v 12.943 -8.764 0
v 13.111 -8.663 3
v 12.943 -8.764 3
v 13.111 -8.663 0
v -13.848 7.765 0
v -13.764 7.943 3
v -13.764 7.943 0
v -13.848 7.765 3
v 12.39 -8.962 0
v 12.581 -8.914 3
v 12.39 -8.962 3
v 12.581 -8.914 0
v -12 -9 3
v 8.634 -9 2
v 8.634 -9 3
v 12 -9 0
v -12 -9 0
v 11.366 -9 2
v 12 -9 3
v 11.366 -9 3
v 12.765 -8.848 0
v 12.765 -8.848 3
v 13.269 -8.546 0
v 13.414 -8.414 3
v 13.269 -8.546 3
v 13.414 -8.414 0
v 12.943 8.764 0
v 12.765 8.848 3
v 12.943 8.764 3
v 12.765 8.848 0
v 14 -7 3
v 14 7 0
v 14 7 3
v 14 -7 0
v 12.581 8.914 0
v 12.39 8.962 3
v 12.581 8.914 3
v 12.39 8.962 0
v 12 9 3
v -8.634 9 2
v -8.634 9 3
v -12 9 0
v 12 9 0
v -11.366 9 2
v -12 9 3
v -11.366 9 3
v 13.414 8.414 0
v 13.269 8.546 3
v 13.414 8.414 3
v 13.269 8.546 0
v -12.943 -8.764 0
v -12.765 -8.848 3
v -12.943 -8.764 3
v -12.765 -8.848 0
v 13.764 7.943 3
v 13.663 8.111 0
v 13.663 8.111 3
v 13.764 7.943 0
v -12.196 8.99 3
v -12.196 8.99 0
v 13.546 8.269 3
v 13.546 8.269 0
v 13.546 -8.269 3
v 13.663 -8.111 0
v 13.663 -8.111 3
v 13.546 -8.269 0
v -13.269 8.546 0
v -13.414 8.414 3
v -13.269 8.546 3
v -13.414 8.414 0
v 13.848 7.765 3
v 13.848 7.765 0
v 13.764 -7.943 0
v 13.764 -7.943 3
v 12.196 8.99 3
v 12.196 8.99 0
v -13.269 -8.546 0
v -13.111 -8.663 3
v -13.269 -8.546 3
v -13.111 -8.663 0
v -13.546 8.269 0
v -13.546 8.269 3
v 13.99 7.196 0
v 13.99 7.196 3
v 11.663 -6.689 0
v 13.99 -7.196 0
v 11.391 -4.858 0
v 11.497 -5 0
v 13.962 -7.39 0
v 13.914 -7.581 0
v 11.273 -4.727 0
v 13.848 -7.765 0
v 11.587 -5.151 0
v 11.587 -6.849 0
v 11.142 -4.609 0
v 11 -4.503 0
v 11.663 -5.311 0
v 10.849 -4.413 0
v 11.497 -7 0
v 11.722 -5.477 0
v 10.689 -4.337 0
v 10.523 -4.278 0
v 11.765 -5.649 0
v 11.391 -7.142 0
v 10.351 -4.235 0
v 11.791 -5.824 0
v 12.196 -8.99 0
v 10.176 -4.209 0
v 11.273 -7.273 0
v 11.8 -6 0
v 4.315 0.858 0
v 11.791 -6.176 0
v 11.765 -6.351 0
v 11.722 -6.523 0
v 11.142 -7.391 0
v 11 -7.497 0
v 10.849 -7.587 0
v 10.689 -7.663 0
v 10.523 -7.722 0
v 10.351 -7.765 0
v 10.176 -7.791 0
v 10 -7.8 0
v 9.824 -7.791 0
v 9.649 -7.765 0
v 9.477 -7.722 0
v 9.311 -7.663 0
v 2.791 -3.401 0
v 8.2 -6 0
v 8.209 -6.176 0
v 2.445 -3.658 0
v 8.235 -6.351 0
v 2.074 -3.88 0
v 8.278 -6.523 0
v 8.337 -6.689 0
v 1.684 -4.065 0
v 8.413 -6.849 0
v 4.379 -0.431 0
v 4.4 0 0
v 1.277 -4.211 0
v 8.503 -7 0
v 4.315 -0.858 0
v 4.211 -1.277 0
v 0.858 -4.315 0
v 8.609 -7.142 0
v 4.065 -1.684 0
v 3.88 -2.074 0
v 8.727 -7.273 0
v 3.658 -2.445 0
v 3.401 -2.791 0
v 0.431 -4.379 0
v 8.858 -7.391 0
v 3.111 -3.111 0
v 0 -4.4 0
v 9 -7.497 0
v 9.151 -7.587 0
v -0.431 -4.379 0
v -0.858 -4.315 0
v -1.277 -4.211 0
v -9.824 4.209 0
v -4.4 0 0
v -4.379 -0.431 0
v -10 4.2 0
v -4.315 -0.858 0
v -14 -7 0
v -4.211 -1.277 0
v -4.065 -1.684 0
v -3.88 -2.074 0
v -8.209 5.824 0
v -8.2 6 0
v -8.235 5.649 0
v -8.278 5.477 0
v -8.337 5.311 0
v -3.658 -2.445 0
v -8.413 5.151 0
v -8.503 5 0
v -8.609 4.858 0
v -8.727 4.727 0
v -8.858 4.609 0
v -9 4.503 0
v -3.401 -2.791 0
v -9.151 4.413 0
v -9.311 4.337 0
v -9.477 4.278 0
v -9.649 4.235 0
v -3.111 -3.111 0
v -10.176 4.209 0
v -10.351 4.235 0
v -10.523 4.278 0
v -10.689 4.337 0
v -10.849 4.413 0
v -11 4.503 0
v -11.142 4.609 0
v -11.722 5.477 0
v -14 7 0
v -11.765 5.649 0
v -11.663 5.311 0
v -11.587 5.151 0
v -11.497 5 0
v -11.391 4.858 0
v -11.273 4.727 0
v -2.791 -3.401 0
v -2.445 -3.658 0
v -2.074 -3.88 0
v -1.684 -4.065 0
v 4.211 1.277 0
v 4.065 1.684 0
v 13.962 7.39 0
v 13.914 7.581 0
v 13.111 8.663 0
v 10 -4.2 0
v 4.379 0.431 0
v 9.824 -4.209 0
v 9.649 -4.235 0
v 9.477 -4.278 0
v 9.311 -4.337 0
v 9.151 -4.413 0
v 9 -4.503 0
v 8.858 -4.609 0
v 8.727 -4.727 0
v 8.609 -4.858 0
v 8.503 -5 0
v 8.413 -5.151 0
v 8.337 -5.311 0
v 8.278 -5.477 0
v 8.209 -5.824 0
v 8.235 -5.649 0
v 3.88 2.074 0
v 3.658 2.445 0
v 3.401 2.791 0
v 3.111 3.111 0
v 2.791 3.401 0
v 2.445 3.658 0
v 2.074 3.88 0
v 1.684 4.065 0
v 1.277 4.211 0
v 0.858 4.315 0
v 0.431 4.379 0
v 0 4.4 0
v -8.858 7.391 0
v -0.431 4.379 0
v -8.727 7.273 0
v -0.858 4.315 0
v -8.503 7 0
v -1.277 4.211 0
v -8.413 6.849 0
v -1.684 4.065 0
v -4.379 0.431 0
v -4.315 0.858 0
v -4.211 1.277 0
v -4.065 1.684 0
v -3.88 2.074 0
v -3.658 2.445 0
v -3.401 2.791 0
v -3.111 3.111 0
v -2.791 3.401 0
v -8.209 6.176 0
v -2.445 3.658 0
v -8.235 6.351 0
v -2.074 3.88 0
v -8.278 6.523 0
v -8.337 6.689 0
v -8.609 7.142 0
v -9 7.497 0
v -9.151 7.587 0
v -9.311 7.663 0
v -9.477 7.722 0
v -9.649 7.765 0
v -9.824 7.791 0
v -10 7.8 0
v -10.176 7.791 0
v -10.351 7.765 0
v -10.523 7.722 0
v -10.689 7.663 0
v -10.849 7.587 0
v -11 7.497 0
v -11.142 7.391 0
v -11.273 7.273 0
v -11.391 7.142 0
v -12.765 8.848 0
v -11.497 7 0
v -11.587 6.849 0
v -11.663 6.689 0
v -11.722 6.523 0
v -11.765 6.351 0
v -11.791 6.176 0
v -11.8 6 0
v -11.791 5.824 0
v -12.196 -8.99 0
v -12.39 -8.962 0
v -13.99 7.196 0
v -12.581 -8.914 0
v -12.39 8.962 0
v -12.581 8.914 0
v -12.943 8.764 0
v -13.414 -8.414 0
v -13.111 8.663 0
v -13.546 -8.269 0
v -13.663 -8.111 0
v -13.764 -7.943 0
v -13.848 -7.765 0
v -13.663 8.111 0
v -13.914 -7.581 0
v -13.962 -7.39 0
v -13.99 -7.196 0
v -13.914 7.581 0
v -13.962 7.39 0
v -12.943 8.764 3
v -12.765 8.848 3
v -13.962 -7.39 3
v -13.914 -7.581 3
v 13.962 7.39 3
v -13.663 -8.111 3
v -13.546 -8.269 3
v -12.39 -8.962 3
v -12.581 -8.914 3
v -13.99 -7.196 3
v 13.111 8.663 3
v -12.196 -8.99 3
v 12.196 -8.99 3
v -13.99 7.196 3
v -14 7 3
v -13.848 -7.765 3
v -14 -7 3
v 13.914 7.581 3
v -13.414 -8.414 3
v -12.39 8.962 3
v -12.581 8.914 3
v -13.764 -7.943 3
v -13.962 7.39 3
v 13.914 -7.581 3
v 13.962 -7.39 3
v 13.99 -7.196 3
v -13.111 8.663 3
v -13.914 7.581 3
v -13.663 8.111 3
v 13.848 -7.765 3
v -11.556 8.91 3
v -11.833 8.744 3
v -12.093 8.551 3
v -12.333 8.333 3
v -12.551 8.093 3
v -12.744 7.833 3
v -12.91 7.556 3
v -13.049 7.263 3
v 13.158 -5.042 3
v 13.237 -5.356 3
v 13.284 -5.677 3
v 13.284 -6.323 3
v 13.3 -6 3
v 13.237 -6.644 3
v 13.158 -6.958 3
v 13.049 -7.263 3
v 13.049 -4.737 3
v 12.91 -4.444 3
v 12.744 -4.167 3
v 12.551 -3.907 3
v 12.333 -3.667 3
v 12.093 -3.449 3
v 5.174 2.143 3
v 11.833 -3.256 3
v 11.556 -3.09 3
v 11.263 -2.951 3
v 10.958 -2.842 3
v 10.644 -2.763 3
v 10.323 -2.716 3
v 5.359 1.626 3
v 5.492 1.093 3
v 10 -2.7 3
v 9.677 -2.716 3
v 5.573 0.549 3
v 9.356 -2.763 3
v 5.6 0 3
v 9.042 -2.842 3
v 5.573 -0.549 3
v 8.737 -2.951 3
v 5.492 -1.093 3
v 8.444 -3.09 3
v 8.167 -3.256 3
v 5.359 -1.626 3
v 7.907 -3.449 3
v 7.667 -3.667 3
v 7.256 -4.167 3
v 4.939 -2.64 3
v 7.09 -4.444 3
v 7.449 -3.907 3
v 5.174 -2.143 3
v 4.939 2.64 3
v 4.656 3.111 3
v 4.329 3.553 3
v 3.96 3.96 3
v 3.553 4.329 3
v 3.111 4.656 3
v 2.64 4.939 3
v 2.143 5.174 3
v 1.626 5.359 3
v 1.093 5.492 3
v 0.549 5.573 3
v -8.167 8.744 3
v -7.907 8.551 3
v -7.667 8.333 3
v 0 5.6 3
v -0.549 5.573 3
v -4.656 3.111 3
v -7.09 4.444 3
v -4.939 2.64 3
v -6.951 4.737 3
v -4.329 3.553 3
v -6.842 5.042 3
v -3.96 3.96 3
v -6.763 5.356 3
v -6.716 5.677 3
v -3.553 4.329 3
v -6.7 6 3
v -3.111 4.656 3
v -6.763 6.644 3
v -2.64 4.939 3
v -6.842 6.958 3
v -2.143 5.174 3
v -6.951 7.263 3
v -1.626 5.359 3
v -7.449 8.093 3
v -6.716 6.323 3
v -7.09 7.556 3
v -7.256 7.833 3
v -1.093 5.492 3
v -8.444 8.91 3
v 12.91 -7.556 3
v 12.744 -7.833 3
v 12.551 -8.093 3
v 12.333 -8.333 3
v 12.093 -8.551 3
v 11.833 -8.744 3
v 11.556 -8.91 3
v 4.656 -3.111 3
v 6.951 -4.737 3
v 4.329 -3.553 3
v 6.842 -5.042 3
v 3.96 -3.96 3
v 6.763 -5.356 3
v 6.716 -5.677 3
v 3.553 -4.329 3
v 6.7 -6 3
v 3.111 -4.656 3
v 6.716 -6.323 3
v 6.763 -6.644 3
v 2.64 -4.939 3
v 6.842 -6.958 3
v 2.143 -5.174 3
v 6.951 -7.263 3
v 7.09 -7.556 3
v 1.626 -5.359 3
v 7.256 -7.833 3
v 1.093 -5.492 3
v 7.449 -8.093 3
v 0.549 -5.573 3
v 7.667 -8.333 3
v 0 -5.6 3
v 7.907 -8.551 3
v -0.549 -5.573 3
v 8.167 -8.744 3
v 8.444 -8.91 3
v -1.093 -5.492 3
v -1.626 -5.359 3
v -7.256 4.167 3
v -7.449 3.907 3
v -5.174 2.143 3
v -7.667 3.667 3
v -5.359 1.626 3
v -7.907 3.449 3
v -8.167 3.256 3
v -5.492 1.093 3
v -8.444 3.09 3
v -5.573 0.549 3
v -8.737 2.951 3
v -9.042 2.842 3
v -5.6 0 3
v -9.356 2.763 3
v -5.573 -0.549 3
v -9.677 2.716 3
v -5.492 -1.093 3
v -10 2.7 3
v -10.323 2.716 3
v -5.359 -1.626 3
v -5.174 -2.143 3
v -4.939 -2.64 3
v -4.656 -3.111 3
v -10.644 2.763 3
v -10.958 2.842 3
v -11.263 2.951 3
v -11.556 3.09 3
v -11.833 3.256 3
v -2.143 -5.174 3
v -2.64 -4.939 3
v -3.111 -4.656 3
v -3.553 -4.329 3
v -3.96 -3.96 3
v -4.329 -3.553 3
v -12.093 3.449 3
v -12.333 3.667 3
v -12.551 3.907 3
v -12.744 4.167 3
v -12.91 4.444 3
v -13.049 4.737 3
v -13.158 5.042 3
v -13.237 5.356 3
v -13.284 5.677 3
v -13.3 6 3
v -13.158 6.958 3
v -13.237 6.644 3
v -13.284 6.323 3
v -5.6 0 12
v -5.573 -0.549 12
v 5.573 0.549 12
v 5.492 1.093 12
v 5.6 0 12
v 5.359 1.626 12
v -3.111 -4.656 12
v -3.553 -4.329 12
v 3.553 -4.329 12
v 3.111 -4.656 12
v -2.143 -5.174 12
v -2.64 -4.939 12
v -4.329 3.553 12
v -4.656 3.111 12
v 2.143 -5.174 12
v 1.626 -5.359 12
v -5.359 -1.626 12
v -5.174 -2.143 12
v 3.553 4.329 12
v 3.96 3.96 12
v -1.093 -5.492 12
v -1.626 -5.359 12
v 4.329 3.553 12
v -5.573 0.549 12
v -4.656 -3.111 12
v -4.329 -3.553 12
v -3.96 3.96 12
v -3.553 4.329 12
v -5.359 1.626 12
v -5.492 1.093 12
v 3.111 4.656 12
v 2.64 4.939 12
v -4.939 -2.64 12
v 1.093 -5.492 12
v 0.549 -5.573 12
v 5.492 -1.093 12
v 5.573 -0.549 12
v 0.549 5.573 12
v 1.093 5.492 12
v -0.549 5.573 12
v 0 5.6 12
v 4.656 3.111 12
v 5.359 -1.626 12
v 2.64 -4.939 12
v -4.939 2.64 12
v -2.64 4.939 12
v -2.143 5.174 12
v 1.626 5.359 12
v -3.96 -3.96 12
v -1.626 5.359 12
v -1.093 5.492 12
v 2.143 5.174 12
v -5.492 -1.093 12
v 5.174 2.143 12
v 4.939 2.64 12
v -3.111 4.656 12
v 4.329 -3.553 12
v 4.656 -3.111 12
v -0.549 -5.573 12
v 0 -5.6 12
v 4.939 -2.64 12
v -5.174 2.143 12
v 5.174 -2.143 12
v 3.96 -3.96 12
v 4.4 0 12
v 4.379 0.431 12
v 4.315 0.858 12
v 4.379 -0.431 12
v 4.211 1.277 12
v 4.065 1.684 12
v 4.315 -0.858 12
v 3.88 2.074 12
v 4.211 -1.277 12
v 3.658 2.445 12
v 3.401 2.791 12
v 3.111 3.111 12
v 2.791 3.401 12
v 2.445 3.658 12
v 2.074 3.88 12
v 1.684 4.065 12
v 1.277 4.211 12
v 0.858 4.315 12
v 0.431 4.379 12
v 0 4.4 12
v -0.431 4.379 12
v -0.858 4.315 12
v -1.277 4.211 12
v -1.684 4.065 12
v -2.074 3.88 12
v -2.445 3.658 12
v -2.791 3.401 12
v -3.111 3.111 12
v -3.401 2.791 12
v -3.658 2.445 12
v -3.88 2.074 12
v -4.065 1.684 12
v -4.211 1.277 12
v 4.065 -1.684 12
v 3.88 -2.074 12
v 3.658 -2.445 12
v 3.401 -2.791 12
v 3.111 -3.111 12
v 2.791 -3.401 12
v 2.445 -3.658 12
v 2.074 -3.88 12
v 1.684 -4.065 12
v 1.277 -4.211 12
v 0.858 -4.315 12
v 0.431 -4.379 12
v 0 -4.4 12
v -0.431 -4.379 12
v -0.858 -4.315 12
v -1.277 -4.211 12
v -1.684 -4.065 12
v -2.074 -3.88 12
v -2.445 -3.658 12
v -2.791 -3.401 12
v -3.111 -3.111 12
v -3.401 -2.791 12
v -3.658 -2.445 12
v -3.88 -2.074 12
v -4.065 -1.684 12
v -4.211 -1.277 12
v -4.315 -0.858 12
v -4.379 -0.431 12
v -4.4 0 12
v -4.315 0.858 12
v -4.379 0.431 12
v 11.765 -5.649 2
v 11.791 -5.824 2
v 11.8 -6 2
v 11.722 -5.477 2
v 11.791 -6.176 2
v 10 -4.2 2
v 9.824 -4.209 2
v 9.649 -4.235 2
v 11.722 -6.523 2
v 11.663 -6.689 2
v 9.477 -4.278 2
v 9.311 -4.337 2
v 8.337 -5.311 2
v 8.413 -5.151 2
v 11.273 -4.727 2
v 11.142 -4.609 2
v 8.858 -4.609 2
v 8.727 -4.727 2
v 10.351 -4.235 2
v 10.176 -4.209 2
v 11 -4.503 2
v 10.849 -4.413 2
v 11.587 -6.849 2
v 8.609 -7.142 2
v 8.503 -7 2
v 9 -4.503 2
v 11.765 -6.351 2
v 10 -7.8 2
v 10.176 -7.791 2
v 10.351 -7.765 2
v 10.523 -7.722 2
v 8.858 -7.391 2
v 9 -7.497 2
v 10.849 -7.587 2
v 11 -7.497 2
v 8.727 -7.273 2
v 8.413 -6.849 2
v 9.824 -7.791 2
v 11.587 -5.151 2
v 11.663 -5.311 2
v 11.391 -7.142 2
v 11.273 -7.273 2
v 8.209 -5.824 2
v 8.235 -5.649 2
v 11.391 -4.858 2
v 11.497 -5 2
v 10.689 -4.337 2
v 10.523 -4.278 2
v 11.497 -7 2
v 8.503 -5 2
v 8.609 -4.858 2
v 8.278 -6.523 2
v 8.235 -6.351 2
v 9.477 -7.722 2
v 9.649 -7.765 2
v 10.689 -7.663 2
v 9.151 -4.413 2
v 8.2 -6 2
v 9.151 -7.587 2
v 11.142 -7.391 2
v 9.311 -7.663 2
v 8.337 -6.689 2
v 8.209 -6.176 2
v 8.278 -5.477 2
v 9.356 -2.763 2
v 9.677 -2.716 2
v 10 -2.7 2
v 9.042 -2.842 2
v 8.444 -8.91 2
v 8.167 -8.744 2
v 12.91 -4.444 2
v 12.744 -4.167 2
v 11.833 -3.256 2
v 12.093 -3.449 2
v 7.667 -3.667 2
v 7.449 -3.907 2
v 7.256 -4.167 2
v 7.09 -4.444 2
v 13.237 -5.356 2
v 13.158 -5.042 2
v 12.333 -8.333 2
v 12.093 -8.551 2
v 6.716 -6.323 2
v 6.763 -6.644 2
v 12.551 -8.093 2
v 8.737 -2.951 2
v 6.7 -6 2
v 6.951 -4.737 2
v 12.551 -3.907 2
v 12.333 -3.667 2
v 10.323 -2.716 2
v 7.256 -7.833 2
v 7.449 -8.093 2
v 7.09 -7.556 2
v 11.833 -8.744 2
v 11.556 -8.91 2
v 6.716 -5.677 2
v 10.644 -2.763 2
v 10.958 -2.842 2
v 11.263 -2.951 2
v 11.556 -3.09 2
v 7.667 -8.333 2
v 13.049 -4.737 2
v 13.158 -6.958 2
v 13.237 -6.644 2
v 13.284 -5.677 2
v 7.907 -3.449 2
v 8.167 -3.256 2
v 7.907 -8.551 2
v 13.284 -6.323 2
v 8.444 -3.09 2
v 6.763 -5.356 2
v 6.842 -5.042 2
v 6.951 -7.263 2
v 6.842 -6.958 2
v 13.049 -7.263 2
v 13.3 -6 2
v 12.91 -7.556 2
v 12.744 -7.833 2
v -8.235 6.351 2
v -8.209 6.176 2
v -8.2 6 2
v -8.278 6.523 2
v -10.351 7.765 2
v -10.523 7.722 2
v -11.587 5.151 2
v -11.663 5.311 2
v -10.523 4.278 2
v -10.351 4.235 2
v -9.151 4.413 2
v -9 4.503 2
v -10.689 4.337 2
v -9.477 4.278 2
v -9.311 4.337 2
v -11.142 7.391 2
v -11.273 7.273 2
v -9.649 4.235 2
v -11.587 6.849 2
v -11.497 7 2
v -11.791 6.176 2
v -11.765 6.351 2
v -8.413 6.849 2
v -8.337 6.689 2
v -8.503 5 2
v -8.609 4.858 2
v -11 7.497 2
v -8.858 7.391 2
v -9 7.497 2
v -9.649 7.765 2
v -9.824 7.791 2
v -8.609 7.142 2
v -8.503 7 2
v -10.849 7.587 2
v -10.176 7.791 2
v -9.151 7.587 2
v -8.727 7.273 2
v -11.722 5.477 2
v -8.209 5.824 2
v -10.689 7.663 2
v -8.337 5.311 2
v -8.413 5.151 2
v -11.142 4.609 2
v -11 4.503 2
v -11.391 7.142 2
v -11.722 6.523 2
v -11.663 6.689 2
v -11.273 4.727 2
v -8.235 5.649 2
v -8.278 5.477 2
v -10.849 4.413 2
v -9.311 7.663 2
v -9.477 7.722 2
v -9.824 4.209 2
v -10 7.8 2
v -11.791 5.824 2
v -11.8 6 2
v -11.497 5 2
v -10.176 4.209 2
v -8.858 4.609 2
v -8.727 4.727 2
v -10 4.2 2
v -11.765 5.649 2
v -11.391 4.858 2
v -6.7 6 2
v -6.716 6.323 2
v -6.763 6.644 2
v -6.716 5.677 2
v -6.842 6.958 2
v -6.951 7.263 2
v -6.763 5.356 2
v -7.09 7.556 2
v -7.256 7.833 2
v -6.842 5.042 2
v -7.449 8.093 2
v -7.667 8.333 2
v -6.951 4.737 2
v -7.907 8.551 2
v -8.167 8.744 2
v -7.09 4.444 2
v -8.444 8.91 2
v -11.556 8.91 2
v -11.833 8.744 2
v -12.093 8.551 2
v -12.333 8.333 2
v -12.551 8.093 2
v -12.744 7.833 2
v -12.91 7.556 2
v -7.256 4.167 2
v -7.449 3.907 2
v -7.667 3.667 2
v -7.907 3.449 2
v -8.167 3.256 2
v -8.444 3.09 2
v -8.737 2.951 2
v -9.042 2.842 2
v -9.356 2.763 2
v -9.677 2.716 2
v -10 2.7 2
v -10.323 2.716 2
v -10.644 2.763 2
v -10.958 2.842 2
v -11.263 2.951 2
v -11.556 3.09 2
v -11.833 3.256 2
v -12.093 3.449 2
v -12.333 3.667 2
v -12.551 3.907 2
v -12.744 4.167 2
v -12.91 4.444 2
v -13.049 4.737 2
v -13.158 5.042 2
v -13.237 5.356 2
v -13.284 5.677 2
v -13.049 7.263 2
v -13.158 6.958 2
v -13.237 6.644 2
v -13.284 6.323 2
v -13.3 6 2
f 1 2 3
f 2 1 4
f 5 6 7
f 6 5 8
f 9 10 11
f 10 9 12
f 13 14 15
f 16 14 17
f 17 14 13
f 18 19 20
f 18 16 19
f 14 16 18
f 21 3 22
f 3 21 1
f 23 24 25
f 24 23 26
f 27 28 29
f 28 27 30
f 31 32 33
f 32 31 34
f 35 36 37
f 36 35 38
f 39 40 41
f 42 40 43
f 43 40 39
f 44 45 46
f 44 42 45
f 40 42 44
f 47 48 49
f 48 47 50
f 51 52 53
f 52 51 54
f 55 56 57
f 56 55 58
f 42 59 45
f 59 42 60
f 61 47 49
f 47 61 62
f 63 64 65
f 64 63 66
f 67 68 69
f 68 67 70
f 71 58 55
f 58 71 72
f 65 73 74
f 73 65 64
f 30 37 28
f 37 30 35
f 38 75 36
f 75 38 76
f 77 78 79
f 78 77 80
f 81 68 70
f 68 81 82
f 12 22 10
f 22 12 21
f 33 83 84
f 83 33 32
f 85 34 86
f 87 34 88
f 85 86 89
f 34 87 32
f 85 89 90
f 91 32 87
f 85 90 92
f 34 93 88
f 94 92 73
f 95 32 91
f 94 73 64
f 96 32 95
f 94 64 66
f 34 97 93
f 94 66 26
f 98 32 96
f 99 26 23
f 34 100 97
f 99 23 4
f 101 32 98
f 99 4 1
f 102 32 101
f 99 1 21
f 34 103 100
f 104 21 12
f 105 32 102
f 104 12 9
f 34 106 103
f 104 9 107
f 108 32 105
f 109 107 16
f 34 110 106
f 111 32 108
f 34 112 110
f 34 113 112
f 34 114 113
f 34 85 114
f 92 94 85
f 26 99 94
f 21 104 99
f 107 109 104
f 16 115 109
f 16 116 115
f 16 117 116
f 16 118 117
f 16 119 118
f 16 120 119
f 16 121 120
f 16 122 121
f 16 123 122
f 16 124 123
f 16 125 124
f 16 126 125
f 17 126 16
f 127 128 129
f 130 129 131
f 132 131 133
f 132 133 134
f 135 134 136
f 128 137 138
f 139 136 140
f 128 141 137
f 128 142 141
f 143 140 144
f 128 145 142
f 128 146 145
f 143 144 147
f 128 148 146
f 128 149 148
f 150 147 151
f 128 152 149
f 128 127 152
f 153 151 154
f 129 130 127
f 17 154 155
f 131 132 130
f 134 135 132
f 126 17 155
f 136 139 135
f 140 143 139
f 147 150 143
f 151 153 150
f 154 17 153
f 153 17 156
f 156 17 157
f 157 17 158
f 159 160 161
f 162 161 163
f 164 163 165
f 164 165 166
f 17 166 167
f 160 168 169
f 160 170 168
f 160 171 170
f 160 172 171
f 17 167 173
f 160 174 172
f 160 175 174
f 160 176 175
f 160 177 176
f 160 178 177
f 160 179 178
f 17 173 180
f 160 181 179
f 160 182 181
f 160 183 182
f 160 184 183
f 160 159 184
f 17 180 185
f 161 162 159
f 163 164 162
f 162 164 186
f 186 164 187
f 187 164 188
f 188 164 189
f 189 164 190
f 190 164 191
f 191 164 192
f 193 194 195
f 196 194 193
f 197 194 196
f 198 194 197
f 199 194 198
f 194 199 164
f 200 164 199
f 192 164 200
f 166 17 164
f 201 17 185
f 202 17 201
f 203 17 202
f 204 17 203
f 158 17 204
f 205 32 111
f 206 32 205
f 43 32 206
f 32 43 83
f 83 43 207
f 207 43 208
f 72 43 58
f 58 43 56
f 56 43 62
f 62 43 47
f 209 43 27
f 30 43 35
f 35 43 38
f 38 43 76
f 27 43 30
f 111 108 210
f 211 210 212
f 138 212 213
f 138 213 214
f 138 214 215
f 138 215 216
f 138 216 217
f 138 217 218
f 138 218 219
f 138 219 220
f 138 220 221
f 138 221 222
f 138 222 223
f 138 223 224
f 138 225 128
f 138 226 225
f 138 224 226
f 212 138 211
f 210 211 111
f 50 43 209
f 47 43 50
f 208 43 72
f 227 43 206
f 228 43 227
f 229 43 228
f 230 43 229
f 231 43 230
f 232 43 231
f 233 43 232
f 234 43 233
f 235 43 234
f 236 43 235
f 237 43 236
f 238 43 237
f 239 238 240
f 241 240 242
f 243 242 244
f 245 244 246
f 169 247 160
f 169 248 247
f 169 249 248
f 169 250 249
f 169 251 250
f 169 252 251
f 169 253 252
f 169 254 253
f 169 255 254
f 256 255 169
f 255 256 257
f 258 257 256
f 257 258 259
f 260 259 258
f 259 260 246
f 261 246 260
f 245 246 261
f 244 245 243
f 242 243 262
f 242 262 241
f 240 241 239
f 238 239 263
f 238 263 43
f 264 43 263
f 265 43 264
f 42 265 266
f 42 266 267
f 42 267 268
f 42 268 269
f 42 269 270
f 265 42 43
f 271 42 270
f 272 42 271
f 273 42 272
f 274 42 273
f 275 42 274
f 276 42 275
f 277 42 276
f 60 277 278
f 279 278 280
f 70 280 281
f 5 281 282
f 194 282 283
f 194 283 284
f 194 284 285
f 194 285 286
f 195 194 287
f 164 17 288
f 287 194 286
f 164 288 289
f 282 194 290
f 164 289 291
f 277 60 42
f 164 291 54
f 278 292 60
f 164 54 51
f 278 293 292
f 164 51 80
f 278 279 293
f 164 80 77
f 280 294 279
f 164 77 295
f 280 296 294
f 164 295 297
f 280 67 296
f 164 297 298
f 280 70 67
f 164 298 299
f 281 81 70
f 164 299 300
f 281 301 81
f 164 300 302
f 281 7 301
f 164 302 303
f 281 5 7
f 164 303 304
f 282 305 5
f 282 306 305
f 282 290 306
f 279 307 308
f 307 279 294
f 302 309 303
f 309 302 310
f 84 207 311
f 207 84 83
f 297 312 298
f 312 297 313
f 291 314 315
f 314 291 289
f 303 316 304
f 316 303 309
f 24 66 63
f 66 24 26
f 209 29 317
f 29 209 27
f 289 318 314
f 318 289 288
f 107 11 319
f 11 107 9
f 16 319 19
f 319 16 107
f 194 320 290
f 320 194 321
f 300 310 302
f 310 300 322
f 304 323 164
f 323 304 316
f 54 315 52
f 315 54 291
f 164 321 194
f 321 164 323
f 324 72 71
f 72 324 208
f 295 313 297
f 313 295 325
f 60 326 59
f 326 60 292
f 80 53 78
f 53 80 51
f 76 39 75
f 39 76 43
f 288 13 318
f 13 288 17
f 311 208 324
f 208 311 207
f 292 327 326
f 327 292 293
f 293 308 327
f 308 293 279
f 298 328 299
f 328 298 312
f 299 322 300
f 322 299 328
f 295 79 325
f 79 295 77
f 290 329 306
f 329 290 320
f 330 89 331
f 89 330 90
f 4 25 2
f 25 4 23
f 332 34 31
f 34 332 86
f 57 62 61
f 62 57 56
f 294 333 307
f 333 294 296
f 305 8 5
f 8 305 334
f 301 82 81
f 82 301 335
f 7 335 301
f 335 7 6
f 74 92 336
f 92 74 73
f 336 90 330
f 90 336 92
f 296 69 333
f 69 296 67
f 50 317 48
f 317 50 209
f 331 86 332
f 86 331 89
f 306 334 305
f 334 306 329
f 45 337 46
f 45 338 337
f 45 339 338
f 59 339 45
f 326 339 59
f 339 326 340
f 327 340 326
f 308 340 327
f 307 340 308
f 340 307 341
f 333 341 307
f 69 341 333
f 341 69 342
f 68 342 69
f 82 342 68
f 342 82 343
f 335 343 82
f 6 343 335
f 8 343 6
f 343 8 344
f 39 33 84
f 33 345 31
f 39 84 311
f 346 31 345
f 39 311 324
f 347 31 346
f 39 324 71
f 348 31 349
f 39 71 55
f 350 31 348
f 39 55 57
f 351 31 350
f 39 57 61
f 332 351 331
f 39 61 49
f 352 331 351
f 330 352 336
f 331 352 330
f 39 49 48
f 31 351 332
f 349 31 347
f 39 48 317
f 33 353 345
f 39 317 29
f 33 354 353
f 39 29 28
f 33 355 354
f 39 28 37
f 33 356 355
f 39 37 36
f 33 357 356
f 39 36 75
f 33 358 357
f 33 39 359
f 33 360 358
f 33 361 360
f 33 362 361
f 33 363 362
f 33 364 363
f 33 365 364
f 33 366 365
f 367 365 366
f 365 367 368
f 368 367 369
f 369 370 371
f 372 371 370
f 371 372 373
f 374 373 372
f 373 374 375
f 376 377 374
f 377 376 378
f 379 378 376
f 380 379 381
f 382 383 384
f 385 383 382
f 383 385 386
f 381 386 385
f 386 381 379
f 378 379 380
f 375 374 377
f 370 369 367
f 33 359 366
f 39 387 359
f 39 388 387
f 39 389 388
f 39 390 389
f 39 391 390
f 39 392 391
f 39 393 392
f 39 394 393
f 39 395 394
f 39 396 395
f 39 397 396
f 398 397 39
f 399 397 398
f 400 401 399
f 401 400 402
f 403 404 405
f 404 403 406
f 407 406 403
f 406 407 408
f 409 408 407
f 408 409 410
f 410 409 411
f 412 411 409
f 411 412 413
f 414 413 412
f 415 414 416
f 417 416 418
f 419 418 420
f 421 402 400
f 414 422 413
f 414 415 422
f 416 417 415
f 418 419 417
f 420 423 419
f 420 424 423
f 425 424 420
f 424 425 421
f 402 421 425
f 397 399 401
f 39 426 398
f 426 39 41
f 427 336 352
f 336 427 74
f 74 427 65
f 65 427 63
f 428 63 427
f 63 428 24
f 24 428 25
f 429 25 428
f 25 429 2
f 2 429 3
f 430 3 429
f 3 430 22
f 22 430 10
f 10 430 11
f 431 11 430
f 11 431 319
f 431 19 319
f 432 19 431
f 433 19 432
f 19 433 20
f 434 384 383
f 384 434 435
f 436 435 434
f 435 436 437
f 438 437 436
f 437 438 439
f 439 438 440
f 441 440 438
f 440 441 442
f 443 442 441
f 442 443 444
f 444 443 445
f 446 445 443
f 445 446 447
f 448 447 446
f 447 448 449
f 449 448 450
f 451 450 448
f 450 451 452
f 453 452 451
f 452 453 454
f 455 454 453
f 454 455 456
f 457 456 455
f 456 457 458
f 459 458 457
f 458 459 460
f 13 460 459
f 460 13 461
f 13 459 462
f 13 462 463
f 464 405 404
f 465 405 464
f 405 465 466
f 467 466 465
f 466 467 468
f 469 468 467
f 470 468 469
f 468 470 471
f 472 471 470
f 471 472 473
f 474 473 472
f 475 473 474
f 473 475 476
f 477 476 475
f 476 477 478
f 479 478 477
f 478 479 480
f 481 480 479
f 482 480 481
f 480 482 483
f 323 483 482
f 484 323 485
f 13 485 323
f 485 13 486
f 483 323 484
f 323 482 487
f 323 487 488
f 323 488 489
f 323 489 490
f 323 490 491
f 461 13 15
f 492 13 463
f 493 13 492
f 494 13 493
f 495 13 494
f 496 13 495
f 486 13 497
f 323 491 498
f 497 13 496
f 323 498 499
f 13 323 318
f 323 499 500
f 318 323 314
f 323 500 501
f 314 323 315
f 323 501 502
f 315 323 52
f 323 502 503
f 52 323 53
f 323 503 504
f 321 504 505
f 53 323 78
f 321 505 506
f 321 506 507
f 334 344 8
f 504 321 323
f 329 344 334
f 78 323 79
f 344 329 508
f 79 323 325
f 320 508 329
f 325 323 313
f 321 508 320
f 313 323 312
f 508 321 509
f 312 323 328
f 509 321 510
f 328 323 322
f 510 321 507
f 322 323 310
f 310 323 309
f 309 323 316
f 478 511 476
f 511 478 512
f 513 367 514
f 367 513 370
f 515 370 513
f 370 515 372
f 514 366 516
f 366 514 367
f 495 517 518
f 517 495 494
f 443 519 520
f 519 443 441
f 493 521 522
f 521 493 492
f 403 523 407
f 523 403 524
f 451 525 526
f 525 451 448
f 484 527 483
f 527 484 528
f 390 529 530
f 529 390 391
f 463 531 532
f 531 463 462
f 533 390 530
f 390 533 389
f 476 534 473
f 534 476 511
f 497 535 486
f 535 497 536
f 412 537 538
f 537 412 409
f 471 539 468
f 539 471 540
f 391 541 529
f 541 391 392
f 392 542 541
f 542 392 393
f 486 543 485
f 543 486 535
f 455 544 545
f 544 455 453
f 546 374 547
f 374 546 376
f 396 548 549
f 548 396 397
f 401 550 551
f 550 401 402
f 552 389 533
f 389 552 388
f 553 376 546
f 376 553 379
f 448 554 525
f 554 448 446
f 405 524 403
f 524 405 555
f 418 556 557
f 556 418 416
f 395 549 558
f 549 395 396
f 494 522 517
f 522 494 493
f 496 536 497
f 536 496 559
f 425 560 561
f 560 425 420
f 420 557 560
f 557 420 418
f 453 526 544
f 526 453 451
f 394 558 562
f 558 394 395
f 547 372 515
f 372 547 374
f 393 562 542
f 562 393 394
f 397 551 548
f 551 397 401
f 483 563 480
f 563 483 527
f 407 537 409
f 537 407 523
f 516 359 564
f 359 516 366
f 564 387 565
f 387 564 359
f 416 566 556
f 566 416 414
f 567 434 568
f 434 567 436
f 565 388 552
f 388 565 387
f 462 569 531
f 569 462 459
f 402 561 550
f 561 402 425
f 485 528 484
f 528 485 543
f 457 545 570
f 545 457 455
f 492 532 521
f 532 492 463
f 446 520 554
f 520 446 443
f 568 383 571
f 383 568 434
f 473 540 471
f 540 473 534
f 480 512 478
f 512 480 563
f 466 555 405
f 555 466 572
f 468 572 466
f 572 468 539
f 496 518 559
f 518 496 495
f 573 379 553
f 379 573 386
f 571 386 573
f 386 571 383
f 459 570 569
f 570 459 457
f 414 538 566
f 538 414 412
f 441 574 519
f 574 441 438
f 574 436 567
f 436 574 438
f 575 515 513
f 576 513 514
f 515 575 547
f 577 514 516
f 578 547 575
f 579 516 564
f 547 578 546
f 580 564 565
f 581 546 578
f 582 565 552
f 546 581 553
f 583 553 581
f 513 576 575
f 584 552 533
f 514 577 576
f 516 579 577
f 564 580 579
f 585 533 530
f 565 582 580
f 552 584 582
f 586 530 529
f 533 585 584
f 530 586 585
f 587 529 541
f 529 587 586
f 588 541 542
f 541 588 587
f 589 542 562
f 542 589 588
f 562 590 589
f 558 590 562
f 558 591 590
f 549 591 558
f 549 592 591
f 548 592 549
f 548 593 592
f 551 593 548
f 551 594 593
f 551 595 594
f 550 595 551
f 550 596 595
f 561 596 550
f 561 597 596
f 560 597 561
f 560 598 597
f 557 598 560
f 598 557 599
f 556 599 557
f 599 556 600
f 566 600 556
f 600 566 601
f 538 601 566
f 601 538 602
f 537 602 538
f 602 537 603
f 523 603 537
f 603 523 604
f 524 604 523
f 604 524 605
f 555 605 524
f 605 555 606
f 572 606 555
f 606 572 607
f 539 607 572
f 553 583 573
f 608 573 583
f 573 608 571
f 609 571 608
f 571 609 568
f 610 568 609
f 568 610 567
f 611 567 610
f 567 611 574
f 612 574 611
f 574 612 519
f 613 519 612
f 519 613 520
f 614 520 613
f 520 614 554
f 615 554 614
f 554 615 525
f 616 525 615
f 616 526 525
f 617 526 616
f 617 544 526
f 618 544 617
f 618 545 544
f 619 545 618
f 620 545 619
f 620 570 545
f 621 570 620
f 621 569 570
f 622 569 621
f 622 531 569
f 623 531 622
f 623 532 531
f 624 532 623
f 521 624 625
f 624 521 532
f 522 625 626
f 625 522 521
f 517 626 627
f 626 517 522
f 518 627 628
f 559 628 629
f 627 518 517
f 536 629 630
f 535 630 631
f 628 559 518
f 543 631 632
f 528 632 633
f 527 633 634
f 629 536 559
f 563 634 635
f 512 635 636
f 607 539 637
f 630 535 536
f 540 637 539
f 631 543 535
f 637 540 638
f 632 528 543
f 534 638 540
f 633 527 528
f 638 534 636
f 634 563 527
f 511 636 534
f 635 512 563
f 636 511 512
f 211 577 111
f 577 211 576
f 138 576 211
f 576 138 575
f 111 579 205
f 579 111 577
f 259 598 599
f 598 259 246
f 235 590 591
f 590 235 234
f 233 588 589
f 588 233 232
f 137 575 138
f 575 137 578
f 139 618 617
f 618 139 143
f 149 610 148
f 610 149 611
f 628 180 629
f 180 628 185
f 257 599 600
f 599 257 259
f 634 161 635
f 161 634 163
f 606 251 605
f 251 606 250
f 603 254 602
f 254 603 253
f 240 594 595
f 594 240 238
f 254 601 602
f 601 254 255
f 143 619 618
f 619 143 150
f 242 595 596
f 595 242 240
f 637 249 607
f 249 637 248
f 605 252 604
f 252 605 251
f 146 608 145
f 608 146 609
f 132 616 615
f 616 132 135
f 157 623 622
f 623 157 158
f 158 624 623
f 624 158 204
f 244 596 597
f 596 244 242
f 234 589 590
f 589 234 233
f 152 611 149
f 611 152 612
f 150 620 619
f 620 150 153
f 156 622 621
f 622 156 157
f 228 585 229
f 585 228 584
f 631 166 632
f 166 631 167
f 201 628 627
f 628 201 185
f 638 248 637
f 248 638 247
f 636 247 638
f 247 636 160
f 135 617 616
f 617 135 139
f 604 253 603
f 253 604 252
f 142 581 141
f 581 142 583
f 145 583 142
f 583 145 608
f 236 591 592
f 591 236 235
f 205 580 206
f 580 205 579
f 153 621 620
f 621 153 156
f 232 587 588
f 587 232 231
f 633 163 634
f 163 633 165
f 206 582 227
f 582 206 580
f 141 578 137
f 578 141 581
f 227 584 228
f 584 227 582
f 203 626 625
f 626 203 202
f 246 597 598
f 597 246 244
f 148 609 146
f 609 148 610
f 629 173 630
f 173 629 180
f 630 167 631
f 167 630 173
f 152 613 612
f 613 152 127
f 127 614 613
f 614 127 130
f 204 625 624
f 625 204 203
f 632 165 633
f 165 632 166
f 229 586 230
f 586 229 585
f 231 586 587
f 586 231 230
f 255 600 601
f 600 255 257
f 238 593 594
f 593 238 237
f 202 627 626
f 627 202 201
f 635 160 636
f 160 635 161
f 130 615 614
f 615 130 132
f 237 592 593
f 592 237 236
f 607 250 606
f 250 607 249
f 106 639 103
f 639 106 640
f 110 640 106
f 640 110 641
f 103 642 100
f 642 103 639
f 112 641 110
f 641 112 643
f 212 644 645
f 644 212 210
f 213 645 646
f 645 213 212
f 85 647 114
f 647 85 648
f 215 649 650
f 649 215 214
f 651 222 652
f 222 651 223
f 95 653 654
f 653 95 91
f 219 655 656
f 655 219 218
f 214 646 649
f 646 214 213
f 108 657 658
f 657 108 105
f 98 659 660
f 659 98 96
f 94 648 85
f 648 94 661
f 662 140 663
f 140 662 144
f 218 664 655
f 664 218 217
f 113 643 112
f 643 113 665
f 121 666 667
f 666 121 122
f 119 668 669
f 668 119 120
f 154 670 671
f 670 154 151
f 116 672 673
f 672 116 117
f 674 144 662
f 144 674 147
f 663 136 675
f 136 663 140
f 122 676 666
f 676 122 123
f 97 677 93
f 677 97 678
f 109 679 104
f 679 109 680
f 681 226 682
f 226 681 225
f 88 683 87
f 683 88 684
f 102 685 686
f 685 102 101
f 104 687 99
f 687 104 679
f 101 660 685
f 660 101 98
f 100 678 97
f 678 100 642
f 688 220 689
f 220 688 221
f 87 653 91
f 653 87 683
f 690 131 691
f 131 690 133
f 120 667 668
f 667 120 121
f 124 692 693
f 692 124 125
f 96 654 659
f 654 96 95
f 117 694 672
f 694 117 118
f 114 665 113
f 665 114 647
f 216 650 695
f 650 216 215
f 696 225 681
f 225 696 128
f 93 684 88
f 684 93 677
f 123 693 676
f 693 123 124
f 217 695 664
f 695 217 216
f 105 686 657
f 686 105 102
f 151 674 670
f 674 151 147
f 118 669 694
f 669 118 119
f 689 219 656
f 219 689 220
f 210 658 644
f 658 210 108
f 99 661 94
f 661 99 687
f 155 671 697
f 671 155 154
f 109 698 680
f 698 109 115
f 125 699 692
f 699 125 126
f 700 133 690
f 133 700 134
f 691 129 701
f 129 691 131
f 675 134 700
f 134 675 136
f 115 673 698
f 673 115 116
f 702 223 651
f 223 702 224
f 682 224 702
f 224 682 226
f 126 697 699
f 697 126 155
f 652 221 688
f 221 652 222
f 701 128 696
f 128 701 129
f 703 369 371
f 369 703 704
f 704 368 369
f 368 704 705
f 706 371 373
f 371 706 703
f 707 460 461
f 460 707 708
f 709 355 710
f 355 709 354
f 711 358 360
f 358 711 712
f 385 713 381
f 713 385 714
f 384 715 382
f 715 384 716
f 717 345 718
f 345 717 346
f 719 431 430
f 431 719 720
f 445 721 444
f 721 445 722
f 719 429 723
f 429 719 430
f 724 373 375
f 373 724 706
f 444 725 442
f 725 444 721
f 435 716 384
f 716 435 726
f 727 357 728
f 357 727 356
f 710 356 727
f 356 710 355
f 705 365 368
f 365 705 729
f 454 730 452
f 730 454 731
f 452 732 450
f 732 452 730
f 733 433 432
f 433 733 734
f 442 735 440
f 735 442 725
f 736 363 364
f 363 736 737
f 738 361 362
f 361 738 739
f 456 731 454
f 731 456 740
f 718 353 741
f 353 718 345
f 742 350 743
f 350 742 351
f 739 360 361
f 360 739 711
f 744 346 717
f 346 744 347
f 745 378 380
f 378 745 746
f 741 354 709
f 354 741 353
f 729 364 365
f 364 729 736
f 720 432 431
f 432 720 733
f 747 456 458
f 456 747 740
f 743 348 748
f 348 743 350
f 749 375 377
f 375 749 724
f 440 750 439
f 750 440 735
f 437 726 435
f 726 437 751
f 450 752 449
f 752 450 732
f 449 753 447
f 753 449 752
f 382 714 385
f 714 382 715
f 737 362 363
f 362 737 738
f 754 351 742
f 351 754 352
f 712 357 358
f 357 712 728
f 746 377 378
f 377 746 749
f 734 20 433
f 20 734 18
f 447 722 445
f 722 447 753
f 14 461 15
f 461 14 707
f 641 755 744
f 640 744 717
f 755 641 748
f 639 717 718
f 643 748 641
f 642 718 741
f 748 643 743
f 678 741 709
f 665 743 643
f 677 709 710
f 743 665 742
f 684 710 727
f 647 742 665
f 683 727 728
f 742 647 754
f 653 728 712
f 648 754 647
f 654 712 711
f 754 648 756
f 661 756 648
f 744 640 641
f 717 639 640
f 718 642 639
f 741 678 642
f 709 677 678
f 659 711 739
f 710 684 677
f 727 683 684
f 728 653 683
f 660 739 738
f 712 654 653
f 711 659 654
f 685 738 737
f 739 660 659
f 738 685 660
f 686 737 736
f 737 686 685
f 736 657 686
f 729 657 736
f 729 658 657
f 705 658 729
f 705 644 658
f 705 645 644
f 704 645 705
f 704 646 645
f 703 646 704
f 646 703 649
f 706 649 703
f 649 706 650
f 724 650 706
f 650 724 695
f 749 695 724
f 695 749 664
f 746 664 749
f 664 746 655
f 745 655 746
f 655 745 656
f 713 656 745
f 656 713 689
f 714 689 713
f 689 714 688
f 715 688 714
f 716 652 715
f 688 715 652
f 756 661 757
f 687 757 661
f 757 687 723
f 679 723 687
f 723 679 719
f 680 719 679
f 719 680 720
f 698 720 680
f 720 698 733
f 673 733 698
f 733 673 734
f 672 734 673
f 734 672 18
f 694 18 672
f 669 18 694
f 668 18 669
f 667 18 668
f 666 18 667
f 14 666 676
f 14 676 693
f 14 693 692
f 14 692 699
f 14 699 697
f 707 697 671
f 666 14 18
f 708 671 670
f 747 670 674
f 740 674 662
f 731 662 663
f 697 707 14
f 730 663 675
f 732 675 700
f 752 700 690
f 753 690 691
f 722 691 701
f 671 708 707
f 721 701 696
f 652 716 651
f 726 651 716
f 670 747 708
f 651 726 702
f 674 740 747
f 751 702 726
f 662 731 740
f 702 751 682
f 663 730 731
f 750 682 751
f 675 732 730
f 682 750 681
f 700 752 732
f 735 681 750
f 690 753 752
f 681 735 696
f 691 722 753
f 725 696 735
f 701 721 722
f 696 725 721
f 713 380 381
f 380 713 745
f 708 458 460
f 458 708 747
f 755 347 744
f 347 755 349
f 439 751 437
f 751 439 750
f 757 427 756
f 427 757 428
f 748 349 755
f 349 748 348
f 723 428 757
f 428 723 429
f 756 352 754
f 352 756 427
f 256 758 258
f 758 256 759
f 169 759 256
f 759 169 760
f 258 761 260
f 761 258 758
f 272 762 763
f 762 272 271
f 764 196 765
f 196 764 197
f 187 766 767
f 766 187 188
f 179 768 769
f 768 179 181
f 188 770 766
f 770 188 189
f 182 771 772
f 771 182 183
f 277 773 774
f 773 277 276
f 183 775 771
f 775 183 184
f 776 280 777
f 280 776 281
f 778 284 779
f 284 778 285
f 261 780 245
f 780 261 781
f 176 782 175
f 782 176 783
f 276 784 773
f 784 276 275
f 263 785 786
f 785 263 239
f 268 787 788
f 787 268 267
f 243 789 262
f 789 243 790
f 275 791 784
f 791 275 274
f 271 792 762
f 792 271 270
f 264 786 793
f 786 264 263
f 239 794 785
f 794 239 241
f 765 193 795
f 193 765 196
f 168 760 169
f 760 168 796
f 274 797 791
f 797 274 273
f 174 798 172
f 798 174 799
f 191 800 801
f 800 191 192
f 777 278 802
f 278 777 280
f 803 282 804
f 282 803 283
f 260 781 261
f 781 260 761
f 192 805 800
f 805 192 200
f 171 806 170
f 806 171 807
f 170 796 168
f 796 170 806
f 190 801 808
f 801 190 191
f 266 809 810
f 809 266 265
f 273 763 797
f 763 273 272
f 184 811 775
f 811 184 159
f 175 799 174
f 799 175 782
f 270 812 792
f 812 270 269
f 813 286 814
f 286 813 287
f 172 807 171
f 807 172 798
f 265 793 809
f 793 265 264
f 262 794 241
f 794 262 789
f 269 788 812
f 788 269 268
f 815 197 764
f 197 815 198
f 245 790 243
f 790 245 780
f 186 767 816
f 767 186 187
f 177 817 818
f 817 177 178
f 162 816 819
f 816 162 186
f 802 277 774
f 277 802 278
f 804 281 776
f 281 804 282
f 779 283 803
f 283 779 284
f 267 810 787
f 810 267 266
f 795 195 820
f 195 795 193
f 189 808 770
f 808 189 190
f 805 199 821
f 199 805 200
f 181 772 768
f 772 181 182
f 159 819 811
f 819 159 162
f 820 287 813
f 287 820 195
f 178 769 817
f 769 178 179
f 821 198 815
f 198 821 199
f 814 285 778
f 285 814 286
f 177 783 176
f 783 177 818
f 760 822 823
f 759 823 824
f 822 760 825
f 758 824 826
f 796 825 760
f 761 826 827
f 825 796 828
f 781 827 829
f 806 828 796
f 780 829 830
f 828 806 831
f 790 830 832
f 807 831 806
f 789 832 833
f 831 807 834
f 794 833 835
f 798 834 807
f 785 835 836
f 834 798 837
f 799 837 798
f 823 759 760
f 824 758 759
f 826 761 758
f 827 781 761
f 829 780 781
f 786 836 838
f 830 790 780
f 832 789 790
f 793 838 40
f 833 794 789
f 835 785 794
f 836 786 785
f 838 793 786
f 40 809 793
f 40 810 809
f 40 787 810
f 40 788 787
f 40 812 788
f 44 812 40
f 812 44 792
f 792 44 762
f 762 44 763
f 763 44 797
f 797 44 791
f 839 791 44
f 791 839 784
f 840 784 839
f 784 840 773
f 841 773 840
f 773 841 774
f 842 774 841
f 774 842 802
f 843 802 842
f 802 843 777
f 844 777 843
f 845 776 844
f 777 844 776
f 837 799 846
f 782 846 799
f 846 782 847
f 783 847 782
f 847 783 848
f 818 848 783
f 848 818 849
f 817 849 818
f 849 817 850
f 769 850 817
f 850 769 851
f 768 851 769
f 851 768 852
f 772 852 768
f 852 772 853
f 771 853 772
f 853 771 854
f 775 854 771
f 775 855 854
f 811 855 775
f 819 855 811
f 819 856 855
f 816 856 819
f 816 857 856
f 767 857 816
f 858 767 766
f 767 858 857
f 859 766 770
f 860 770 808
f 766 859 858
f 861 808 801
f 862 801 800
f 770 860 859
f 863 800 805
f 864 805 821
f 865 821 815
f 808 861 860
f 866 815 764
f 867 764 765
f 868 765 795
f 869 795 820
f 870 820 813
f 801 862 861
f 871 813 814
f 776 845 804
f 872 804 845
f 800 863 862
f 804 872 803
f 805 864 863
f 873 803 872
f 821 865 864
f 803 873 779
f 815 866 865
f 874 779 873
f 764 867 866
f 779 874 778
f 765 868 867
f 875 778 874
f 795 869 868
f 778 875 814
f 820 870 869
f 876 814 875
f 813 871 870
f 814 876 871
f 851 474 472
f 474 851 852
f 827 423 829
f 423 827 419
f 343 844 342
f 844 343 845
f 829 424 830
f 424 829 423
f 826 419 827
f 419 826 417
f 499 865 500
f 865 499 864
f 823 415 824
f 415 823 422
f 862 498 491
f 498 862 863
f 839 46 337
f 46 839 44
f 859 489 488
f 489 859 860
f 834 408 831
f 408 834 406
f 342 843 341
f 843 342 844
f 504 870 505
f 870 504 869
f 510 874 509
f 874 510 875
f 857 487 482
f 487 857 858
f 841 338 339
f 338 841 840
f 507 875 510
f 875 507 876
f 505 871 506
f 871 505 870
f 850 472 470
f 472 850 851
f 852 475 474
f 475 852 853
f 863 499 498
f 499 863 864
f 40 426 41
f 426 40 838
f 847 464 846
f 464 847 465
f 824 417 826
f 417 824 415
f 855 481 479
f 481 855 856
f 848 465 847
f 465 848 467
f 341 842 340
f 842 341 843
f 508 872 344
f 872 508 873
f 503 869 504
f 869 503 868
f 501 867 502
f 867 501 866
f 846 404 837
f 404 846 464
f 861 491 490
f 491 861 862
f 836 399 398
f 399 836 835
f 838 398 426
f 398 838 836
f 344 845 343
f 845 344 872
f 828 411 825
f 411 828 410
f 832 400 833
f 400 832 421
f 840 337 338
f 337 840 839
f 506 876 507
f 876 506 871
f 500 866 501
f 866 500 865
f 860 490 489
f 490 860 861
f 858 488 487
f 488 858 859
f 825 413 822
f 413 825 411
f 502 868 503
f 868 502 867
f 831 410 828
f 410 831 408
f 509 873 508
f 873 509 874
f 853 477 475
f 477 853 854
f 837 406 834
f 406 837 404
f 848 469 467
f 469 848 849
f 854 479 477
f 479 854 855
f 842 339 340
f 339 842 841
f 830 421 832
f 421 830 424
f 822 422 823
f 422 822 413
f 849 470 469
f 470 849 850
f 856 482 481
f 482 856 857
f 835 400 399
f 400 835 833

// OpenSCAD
$fn = 64;

boreDiameter = 8.8;  // pen diameter + clearance
boreRadius = boreDiameter / 2;

baseThickness = 3;
M3holeDia = 3.6;
M3nutDia = 6.6;
baseLen = 18;
baseWid = 28;

barrelHieght = 12;
barrelWallThickness = 1.2;

standoffDia = 8;
standoffThickness = 3;
holderOffsetX = 10;
holderOffsetY = -6;


// PEN HOLDER

difference(){
    //solids
    union(){
        // base
        roundedCube([baseWid, baseLen, baseThickness], center=true, radius=2);

        // barrel
        cylinder(	barrelHieght, r1=boreRadius + barrelWallThickness, 
                    r2=boreRadius + barrelWallThickness );
        
        // standoffs
        //translate([holderOffsetX, holderOffsetY, 0])
        //cylinder( standoffThickness, d=standoffDia);
        //translate([-holderOffsetX, -holderOffsetY, 0])
        //cylinder( standoffThickness, d=standoffDia);        
    }

    //cutouts
    union(){
        // bore
        cylinder(barrelHieght + 1, boreRadius, boreRadius);        
        
        //mount holes
        hole_offset = 5;
        translate([holderOffsetX, holderOffsetY, 0])
        cylinder( baseThickness, d=M3holeDia);
        translate([holderOffsetX, holderOffsetY, 2])  rotate([0,0,90])      
        cylinder( baseThickness * 2, d=M3nutDia);        

        translate([-holderOffsetX,- holderOffsetY, 0])
        cylinder( baseThickness, d=M3holeDia);   
        translate([-holderOffsetX, -holderOffsetY, 2]) rotate([0,0,90])
        cylinder( baseThickness * 2, d=M3nutDia);


    }
}





module roundedCube(dims, radius=2, center=false){
    // attempt at replicated cube, but with rounded edges from
    // https://youtu.be/gKOkJWiTgAY
    xdim =dims[0];
    ydim =dims[1];
    zdim =dims[2];
    
    if (center) {
        translate([-xdim/2, -ydim/2, 0]){
            hull(){ 
                translate([radius, radius, 0]) cylinder(zdim, radius, radius);
                translate([xdim-radius, radius, 0]) cylinder(zdim, radius, radius);
                translate([radius, ydim-radius, 0]) cylinder(zdim, radius, radius);
                translate([xdim-radius, ydim-radius, 0]) cylinder(zdim, radius, radius);
            }
        }
    }
    else{
        hull(){ // https://youtu.be/gKOkJWiTgAY
            translate([radius, radius, 0]) cylinder(zdim, radius, radius);
            translate([xdim-radius, radius, 0]) cylinder(zdim, radius, radius);
            translate([radius, ydim-radius, 0]) cylinder(zdim, radius, radius);
            translate([xdim-radius, ydim-radius, 0]) cylinder(zdim, radius, radius);
        }
    }
}


module OldroundedCube(xdim ,ydim ,zdim, rdim){
    translate([-xdim/2, -ydim/2, 0])
	hull(){ // https://youtu.be/gKOkJWiTgAY
		translate([rdim, rdim, 0]) cylinder(zdim, rdim, rdim);
		translate([xdim-rdim, rdim, 0]) cylinder(zdim, rdim, rdim);
		translate([rdim, ydim-rdim, 0]) cylinder(zdim, rdim, rdim);
		translate([xdim-rdim, ydim-rdim, 0]) cylinder(zdim, rdim, rdim);
	}
}
